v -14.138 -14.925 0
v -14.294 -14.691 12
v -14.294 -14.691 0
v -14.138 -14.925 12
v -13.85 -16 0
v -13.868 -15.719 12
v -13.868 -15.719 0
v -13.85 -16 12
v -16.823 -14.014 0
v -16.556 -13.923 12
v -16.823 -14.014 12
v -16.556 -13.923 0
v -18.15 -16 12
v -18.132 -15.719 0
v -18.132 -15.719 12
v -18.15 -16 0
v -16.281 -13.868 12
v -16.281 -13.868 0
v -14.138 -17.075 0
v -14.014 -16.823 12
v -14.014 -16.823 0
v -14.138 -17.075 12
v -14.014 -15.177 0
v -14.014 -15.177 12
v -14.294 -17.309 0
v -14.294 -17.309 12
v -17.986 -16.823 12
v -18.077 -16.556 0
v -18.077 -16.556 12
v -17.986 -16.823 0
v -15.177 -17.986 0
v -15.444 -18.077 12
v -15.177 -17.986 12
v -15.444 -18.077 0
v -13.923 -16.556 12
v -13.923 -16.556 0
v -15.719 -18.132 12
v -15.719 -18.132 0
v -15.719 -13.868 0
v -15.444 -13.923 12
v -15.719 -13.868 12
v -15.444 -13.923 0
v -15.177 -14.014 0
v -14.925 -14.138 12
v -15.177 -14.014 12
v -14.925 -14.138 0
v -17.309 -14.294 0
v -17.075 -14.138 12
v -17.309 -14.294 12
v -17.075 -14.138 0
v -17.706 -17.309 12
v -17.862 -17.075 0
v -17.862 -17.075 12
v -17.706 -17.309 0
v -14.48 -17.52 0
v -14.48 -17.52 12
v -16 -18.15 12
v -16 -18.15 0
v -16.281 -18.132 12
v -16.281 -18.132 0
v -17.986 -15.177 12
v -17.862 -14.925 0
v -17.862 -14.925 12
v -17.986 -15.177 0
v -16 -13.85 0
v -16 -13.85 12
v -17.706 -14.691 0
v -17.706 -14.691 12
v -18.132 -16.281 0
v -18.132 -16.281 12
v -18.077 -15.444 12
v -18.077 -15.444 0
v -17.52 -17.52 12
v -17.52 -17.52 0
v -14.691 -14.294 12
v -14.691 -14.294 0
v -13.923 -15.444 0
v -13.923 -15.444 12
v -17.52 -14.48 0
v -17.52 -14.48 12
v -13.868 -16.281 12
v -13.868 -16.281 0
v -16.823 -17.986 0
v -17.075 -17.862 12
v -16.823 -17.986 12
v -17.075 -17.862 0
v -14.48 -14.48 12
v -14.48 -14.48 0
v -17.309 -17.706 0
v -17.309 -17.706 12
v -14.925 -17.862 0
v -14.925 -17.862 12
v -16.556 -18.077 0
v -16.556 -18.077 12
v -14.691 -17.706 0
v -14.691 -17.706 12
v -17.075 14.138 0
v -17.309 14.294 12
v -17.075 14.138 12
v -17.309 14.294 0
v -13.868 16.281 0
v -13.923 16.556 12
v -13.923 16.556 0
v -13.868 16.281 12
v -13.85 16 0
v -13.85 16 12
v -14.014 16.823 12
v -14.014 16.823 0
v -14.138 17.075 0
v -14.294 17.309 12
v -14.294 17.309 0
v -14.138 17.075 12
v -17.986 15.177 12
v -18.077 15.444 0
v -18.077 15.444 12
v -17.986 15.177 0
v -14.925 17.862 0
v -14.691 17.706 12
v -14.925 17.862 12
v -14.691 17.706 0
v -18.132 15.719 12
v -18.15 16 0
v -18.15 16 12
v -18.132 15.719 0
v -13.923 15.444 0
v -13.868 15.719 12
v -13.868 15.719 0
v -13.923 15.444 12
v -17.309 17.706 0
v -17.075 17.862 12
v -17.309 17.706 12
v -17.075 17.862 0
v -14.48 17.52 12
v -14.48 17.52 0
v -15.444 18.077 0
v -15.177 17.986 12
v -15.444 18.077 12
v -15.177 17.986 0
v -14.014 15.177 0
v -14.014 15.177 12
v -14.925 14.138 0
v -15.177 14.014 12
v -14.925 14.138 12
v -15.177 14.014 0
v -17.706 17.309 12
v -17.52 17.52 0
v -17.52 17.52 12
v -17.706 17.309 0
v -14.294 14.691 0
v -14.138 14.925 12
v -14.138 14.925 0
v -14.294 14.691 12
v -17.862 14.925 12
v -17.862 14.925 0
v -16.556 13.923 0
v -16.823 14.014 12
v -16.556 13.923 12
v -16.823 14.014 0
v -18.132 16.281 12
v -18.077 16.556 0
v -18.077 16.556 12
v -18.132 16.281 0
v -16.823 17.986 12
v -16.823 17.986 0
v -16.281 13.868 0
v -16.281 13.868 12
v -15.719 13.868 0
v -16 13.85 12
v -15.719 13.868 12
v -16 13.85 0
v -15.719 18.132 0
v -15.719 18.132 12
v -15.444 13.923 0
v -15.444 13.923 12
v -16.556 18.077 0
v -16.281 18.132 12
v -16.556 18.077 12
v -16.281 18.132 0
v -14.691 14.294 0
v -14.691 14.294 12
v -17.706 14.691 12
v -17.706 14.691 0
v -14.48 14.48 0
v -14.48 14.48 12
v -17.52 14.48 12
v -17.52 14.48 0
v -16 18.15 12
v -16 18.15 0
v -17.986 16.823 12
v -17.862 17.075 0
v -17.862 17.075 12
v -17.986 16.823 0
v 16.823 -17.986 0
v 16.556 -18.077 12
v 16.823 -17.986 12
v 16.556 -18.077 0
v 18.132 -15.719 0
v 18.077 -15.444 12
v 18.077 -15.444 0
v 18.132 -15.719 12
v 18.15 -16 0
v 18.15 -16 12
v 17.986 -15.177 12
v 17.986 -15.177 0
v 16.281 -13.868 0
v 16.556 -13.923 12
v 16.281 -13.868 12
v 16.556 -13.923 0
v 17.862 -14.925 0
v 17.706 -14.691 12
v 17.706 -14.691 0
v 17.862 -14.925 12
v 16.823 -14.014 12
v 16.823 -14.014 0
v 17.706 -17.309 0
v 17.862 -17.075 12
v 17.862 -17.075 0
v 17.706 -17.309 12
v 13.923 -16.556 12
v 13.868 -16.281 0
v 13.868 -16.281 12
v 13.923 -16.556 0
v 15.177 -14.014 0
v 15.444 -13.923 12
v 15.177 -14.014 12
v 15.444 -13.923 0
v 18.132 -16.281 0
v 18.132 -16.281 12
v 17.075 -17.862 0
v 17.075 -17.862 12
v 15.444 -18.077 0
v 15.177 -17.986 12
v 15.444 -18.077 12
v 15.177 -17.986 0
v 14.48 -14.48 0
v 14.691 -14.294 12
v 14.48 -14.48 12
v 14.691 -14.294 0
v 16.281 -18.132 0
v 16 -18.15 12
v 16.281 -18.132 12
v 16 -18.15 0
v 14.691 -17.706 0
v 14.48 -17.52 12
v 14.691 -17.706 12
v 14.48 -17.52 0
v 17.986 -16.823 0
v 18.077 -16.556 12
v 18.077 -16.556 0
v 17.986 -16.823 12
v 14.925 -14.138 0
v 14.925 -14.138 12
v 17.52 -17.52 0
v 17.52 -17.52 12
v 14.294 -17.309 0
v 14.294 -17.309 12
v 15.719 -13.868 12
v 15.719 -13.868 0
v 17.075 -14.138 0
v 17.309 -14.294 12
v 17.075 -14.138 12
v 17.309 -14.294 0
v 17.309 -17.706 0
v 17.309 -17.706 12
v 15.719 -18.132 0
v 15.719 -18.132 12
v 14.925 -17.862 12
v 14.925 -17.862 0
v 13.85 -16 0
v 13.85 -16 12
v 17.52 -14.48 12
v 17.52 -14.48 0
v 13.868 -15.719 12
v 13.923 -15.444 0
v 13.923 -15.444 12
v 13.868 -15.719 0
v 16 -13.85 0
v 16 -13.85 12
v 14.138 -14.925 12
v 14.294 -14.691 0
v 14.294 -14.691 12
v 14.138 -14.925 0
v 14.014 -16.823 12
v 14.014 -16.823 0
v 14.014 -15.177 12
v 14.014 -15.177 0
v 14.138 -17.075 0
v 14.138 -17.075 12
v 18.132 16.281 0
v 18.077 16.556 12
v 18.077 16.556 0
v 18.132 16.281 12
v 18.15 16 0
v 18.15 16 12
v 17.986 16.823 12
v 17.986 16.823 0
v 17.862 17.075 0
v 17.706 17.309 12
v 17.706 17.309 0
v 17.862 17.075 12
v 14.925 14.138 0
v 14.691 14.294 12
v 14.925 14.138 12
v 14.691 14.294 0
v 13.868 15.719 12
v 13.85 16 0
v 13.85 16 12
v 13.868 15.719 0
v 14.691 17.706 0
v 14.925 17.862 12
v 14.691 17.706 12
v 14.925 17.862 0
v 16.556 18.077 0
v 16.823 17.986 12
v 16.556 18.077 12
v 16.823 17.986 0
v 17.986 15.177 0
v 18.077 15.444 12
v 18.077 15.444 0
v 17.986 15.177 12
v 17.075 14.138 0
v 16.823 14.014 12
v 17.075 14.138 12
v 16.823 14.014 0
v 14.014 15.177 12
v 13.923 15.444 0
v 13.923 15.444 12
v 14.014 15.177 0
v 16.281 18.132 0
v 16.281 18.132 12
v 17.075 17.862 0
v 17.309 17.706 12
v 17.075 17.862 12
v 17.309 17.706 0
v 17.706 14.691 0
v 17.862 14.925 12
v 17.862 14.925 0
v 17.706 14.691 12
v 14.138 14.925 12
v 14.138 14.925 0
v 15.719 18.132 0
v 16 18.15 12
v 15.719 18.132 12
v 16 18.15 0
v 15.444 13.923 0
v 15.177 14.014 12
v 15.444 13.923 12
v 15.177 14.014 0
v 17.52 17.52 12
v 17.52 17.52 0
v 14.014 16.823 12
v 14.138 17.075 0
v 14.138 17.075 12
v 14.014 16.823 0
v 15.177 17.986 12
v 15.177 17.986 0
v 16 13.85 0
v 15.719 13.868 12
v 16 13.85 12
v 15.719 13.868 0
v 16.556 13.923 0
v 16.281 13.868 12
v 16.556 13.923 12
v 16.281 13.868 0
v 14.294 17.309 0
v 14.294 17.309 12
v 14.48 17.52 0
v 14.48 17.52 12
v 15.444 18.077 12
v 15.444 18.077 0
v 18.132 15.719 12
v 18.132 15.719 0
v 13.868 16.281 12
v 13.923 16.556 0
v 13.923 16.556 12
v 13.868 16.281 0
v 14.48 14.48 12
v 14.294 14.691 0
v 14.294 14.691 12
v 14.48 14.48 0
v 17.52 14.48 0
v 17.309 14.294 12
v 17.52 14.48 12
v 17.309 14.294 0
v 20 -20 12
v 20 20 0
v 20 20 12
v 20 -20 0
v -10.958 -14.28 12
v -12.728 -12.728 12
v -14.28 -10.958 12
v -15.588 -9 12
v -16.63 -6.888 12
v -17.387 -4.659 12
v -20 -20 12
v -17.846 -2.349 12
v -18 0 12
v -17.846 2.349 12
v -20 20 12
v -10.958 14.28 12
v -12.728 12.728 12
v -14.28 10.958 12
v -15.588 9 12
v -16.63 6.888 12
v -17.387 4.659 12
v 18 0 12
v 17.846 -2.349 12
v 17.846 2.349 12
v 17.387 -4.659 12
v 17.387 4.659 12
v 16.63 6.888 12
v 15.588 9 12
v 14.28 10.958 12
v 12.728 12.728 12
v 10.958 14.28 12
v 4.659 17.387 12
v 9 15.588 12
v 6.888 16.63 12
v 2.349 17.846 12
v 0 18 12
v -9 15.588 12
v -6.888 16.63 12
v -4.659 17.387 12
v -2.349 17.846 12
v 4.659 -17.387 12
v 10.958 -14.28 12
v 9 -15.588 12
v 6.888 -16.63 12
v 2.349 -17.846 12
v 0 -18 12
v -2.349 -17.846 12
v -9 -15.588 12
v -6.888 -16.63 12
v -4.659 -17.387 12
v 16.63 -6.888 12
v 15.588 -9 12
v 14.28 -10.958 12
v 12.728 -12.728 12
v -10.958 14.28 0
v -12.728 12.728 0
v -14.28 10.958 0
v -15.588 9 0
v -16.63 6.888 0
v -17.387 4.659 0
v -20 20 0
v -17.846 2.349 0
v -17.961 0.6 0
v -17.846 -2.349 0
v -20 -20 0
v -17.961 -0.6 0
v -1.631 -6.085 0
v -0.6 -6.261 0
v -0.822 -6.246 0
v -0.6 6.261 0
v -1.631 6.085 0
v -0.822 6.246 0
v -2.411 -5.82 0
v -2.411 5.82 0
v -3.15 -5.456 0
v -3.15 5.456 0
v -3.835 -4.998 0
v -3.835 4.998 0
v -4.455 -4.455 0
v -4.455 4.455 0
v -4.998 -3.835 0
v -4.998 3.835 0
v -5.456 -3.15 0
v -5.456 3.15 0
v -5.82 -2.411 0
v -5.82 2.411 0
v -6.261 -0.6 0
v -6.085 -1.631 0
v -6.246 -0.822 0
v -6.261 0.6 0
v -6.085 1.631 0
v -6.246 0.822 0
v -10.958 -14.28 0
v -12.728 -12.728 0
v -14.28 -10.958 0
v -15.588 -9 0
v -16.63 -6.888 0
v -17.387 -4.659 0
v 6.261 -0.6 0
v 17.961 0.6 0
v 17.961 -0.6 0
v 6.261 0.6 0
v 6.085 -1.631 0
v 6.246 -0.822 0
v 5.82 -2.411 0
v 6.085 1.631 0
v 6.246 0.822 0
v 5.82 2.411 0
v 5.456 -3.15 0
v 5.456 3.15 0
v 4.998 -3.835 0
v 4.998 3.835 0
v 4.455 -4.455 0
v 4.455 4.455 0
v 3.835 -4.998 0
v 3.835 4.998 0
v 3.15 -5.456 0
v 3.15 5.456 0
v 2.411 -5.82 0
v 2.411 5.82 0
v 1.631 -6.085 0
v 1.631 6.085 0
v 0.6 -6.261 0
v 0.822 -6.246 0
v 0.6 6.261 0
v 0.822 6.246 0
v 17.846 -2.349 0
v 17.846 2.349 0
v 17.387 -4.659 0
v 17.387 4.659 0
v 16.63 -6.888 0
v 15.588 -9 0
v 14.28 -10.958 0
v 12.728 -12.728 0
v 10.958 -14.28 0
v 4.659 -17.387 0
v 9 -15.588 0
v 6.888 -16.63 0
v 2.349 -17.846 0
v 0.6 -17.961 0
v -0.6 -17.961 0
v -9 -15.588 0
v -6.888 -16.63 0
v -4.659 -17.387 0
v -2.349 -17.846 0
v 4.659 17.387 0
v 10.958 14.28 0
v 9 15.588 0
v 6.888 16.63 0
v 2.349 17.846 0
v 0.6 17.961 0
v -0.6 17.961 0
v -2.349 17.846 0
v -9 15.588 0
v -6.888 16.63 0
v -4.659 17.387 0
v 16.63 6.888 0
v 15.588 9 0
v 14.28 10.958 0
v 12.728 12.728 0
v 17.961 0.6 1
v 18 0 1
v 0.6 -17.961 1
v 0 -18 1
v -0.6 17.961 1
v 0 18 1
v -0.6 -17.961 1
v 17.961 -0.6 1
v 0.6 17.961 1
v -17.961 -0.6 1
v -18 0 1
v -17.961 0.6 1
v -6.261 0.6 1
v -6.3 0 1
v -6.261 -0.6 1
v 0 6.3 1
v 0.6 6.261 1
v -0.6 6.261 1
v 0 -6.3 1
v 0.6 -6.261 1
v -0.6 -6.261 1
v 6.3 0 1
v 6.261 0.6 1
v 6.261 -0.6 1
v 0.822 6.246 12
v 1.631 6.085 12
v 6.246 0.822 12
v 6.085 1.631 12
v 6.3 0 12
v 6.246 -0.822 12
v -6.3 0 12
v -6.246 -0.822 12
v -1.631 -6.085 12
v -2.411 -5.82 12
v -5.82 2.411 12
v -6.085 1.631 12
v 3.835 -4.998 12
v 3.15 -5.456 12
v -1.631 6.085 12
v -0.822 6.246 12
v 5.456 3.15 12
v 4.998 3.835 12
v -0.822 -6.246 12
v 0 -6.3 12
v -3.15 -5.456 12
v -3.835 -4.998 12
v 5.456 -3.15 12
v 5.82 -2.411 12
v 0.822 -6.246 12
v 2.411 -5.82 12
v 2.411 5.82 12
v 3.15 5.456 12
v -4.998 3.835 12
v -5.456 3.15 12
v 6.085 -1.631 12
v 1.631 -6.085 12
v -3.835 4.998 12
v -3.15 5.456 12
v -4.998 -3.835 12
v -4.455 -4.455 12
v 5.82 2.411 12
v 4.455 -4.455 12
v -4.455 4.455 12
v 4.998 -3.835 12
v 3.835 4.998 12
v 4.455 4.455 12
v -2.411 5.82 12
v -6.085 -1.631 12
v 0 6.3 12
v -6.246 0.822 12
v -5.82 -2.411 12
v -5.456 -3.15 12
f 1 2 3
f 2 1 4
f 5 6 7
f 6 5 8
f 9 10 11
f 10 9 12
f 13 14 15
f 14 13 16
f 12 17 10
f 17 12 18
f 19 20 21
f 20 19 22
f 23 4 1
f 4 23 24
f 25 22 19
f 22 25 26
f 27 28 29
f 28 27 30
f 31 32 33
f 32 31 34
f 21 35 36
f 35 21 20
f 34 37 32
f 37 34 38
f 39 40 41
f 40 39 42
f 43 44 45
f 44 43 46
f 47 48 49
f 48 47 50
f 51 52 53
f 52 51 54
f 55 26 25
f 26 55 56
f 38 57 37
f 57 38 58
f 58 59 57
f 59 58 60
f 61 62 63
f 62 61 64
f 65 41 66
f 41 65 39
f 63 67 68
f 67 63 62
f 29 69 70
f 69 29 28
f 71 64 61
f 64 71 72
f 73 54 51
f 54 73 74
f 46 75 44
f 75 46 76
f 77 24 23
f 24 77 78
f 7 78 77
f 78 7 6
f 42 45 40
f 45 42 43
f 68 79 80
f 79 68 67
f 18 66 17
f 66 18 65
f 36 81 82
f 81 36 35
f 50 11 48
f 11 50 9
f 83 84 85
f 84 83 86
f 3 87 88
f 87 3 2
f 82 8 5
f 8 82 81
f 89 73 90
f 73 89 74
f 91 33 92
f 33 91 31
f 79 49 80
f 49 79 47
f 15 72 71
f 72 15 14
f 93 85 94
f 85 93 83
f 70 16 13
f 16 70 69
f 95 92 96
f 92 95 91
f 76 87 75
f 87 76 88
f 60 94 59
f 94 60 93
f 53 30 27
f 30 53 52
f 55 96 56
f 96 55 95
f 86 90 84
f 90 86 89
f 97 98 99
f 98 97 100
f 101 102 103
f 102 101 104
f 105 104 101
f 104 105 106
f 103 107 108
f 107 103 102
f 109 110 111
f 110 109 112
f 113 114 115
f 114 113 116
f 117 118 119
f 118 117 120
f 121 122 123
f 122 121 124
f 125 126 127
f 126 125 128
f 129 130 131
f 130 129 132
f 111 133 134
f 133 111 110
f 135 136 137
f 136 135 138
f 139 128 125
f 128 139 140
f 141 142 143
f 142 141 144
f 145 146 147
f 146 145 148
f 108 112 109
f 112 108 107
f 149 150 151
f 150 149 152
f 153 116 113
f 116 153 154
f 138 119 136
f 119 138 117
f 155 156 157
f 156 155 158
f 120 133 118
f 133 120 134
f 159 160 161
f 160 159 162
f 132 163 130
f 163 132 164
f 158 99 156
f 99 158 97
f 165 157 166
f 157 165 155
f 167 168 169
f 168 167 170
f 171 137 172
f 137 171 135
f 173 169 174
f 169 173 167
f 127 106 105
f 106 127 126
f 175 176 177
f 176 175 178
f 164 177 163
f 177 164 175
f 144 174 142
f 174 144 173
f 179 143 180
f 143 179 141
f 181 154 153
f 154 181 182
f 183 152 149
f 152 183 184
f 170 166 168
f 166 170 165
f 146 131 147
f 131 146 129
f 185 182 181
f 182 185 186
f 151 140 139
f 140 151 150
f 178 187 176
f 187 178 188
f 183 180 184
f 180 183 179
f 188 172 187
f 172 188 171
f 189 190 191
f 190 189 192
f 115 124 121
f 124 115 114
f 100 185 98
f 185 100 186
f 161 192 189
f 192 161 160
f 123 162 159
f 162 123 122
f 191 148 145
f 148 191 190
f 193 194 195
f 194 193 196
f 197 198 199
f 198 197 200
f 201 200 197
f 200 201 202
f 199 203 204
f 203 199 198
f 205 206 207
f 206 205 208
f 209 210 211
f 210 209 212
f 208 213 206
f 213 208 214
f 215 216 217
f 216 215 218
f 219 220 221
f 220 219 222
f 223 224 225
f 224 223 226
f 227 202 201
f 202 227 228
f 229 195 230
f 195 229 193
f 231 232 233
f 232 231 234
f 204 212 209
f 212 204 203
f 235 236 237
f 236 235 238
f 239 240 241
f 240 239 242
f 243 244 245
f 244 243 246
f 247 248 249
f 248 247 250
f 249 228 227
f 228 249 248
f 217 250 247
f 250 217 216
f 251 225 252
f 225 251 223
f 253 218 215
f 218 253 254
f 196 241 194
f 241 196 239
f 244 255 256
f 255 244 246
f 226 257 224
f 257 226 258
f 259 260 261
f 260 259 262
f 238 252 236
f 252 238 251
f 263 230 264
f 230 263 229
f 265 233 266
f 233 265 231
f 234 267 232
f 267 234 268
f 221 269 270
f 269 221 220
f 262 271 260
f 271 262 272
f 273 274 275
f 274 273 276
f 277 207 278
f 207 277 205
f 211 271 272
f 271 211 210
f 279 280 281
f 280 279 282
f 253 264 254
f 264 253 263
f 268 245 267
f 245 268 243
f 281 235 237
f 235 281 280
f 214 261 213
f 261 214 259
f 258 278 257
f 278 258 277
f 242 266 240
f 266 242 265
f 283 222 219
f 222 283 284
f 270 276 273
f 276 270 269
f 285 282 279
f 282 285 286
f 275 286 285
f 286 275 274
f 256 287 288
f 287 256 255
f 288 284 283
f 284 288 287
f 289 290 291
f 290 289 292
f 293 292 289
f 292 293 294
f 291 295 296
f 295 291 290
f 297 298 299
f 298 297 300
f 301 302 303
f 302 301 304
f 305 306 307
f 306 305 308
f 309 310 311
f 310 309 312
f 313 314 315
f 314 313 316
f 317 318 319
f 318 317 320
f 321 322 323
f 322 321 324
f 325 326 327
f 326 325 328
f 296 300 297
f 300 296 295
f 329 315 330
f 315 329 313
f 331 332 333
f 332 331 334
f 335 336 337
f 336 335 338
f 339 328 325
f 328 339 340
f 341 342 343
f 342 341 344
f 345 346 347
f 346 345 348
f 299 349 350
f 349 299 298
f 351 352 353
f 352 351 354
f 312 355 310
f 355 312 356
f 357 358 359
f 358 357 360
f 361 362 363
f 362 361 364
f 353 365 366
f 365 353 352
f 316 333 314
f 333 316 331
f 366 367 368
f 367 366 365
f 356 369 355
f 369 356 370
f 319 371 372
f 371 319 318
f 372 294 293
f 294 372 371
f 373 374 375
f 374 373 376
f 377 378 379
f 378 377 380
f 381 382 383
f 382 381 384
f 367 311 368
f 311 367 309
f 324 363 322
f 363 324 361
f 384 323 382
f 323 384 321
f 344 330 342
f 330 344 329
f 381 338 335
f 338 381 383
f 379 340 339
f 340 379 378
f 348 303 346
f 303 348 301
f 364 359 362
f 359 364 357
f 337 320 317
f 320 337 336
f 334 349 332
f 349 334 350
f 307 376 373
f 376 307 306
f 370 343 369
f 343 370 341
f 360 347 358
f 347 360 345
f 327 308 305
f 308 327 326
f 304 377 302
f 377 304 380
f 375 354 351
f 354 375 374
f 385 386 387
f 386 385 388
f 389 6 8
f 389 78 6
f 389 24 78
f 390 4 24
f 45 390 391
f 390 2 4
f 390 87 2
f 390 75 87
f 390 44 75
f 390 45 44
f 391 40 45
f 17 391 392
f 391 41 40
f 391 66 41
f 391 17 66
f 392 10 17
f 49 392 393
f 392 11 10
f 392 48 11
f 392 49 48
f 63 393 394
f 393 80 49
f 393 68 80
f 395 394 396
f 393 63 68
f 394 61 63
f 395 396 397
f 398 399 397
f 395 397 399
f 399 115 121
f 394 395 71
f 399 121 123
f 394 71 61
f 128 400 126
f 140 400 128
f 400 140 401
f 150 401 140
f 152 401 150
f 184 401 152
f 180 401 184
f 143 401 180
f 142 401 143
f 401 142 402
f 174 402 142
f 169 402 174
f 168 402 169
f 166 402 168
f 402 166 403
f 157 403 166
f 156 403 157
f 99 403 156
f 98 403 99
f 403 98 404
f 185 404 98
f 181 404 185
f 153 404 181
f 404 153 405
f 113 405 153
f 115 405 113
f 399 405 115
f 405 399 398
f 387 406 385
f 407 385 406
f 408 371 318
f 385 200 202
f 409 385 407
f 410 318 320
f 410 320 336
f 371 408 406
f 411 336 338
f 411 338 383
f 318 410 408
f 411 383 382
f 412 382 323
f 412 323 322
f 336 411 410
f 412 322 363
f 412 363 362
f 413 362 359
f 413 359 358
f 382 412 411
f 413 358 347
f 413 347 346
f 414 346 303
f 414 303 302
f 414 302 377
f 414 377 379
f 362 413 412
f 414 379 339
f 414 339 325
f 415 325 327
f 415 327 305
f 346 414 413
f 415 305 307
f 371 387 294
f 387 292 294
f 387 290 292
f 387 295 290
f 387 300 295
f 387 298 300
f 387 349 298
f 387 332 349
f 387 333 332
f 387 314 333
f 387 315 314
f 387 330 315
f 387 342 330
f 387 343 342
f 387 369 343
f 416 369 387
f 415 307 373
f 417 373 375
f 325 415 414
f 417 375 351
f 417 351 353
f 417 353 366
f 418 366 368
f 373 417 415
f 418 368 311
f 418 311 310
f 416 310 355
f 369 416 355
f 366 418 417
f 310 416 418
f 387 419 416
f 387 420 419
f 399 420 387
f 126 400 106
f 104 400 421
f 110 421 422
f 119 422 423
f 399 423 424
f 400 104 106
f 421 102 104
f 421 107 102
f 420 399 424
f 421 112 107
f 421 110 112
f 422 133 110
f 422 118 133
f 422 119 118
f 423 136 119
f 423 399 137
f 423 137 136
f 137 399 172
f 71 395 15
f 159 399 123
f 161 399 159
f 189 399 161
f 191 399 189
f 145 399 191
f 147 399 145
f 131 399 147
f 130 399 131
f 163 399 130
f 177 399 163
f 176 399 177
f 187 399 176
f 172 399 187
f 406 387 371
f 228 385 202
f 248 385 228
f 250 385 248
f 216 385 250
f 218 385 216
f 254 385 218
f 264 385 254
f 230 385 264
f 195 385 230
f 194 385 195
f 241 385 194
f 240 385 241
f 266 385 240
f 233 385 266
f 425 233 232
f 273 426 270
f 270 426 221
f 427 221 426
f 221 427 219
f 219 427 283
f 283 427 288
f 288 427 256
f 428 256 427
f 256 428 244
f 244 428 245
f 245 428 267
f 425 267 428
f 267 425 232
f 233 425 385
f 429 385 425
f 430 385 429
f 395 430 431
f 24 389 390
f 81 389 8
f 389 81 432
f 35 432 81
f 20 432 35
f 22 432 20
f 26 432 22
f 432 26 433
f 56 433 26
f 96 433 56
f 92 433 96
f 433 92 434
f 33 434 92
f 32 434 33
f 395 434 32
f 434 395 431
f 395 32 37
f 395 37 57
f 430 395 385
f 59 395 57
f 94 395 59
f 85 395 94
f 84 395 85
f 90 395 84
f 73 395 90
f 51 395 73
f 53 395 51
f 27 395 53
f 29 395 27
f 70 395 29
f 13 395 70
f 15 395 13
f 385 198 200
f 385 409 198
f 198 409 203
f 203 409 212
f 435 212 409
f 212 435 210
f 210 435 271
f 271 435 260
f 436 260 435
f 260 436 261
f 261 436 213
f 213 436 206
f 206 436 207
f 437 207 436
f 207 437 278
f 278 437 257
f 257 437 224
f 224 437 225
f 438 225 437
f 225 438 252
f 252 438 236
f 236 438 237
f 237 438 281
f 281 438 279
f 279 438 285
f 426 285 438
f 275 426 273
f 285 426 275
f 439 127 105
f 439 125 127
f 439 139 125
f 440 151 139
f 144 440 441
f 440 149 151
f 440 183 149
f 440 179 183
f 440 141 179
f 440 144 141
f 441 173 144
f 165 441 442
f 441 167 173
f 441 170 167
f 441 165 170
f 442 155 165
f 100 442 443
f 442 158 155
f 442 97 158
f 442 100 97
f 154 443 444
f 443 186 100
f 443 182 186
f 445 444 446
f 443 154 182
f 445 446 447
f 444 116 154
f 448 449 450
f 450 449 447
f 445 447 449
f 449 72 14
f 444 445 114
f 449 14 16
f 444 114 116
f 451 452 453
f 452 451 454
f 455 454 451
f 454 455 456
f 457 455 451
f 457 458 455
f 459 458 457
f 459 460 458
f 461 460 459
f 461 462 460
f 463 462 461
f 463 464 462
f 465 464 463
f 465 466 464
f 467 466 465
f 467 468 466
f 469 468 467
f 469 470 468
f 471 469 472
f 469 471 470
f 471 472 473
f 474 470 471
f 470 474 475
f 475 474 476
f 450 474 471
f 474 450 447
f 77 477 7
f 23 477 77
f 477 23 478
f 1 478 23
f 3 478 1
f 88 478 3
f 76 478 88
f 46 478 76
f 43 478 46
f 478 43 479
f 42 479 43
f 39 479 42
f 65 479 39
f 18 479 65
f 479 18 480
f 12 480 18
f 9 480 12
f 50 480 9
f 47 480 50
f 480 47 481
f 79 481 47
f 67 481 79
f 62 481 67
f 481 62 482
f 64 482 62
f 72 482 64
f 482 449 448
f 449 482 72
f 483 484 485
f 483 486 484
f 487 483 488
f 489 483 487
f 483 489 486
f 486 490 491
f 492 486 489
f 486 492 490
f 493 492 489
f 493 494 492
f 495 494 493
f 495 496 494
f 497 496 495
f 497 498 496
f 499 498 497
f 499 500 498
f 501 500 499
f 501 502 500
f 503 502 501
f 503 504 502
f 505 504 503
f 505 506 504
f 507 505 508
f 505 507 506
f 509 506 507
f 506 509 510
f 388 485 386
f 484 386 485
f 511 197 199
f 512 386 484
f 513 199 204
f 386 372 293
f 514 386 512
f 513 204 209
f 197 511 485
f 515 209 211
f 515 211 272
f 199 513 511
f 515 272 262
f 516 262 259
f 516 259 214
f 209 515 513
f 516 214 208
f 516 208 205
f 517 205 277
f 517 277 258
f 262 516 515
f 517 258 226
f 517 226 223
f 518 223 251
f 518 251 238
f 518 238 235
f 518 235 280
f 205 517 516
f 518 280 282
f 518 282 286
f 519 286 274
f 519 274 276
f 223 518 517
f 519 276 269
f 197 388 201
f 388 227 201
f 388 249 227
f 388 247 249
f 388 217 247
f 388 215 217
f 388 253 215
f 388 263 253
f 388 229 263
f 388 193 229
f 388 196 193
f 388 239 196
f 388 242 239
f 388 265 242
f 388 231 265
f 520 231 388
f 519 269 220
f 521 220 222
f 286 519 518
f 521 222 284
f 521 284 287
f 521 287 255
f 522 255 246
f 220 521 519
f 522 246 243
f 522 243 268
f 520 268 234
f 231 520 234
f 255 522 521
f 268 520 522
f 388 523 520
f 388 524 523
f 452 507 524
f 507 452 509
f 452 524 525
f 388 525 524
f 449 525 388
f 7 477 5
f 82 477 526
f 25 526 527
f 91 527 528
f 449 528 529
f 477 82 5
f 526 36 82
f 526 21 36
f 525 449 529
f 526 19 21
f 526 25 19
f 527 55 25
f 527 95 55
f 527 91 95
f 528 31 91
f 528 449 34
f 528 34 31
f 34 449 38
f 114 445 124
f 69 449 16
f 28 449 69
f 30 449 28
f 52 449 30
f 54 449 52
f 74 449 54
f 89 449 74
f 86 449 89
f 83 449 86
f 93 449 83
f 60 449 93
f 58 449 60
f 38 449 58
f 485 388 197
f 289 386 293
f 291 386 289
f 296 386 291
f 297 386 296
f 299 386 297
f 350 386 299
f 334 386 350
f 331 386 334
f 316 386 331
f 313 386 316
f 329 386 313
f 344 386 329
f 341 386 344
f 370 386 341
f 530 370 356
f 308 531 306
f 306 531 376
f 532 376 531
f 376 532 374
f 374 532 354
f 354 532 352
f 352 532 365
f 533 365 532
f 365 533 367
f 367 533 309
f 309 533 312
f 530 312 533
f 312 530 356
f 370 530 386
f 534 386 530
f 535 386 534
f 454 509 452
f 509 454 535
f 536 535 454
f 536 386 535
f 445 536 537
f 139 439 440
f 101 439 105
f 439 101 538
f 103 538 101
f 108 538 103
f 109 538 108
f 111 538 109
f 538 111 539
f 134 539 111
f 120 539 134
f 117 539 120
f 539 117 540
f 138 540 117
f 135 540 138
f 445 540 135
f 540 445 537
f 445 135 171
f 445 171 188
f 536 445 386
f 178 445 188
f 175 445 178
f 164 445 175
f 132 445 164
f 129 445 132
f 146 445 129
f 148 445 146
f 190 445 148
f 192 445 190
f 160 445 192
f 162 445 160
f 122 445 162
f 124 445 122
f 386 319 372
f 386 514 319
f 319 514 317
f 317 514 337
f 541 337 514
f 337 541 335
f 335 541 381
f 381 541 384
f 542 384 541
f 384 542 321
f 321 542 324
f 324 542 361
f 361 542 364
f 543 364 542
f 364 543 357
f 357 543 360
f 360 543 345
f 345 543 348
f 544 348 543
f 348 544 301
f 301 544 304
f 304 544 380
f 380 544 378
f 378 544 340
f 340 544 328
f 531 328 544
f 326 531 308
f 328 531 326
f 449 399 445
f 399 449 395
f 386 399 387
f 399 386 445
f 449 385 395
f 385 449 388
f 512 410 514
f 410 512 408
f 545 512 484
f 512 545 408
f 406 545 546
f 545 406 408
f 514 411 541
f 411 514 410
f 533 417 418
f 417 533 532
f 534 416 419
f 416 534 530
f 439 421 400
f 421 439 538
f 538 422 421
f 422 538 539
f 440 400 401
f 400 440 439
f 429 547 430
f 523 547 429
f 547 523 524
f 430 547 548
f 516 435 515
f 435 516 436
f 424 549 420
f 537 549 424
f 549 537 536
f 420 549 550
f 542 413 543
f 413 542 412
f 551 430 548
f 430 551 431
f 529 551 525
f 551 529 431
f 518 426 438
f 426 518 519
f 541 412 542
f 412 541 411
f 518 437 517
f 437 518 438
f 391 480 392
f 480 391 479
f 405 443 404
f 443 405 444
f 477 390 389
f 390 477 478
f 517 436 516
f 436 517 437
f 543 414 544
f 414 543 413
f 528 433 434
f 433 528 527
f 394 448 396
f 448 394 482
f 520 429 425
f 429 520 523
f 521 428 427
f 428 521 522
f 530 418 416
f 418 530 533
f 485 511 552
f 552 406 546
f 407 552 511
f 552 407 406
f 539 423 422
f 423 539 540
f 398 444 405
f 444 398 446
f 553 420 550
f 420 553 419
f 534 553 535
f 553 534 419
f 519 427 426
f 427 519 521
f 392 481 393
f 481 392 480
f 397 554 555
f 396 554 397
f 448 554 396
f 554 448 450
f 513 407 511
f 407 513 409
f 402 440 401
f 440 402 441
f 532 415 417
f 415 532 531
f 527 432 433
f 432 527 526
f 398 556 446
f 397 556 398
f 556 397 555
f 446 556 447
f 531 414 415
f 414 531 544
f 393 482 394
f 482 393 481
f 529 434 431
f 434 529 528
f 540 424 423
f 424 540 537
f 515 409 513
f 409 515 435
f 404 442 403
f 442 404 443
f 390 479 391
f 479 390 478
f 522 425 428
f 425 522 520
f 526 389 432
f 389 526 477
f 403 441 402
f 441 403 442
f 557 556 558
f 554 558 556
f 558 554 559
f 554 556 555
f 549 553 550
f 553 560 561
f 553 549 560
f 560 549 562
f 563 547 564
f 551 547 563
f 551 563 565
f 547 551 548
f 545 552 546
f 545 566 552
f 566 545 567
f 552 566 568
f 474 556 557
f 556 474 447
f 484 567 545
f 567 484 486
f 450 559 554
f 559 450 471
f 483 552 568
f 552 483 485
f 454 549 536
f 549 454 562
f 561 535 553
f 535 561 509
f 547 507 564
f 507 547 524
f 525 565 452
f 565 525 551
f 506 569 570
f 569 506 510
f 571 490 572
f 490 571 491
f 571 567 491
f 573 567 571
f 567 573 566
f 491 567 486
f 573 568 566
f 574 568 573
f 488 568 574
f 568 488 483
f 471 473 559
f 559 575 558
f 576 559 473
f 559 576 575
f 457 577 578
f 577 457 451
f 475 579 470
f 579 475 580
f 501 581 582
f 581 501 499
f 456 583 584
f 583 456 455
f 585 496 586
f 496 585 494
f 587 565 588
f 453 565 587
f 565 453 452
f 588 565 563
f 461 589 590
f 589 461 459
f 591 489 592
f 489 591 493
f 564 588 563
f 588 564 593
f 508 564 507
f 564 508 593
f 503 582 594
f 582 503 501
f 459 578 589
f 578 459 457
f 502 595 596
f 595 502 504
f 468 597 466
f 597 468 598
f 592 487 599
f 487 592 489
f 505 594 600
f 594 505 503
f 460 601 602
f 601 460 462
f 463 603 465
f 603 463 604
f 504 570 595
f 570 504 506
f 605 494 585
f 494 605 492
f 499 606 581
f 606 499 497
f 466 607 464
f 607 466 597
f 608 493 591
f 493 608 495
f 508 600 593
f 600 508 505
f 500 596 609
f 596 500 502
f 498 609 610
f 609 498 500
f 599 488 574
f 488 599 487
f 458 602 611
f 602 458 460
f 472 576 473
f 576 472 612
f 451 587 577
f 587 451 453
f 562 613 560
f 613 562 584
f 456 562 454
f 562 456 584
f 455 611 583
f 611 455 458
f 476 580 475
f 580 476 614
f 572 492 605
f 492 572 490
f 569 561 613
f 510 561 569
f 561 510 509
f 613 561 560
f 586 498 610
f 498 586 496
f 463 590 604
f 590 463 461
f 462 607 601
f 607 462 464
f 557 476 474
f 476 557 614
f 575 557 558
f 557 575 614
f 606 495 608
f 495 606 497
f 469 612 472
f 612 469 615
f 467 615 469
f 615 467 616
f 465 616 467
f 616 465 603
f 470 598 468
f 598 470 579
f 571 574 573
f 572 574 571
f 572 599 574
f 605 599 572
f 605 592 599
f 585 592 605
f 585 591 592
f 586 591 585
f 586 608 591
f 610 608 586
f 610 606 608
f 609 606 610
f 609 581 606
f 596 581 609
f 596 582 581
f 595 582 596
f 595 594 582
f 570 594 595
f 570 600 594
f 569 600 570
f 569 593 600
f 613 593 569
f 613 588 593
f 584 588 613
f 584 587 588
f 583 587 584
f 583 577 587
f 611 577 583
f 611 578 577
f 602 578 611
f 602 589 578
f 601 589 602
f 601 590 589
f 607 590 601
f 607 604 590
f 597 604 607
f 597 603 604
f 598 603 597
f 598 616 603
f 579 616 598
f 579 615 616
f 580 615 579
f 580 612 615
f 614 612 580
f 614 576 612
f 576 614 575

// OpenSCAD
// Library fan reference: max frame, centred XY, z=0 underside, exhaust +Z.
// Frame and mounting holes are dimensioned. Hub/struts are schematic; pads and leads omitted.
W = 40;
L = 40;
H = 12;
HOLE = 4.3;
MOUNTS = [[-16,-16],[-16,16],[16,-16],[16,16]];
R = min(W,L)/2 - 2;
$fn = 48;
union() {
  difference() {
    translate([-W/2,-L/2,0]) cube([W,L,H]);
    translate([0,0,-0.02]) cylinder(r=R,h=H+0.04);
    for (xy=MOUNTS) translate([xy[0],xy[1],-0.02]) cylinder(d=HOLE,h=H+0.04);
  }
  cylinder(r=R*0.35,h=H);
  for (a=[0:90:270]) rotate([0,0,a]) translate([0,-0.6,0]) cube([R+0.5,1.2,1]);
}
